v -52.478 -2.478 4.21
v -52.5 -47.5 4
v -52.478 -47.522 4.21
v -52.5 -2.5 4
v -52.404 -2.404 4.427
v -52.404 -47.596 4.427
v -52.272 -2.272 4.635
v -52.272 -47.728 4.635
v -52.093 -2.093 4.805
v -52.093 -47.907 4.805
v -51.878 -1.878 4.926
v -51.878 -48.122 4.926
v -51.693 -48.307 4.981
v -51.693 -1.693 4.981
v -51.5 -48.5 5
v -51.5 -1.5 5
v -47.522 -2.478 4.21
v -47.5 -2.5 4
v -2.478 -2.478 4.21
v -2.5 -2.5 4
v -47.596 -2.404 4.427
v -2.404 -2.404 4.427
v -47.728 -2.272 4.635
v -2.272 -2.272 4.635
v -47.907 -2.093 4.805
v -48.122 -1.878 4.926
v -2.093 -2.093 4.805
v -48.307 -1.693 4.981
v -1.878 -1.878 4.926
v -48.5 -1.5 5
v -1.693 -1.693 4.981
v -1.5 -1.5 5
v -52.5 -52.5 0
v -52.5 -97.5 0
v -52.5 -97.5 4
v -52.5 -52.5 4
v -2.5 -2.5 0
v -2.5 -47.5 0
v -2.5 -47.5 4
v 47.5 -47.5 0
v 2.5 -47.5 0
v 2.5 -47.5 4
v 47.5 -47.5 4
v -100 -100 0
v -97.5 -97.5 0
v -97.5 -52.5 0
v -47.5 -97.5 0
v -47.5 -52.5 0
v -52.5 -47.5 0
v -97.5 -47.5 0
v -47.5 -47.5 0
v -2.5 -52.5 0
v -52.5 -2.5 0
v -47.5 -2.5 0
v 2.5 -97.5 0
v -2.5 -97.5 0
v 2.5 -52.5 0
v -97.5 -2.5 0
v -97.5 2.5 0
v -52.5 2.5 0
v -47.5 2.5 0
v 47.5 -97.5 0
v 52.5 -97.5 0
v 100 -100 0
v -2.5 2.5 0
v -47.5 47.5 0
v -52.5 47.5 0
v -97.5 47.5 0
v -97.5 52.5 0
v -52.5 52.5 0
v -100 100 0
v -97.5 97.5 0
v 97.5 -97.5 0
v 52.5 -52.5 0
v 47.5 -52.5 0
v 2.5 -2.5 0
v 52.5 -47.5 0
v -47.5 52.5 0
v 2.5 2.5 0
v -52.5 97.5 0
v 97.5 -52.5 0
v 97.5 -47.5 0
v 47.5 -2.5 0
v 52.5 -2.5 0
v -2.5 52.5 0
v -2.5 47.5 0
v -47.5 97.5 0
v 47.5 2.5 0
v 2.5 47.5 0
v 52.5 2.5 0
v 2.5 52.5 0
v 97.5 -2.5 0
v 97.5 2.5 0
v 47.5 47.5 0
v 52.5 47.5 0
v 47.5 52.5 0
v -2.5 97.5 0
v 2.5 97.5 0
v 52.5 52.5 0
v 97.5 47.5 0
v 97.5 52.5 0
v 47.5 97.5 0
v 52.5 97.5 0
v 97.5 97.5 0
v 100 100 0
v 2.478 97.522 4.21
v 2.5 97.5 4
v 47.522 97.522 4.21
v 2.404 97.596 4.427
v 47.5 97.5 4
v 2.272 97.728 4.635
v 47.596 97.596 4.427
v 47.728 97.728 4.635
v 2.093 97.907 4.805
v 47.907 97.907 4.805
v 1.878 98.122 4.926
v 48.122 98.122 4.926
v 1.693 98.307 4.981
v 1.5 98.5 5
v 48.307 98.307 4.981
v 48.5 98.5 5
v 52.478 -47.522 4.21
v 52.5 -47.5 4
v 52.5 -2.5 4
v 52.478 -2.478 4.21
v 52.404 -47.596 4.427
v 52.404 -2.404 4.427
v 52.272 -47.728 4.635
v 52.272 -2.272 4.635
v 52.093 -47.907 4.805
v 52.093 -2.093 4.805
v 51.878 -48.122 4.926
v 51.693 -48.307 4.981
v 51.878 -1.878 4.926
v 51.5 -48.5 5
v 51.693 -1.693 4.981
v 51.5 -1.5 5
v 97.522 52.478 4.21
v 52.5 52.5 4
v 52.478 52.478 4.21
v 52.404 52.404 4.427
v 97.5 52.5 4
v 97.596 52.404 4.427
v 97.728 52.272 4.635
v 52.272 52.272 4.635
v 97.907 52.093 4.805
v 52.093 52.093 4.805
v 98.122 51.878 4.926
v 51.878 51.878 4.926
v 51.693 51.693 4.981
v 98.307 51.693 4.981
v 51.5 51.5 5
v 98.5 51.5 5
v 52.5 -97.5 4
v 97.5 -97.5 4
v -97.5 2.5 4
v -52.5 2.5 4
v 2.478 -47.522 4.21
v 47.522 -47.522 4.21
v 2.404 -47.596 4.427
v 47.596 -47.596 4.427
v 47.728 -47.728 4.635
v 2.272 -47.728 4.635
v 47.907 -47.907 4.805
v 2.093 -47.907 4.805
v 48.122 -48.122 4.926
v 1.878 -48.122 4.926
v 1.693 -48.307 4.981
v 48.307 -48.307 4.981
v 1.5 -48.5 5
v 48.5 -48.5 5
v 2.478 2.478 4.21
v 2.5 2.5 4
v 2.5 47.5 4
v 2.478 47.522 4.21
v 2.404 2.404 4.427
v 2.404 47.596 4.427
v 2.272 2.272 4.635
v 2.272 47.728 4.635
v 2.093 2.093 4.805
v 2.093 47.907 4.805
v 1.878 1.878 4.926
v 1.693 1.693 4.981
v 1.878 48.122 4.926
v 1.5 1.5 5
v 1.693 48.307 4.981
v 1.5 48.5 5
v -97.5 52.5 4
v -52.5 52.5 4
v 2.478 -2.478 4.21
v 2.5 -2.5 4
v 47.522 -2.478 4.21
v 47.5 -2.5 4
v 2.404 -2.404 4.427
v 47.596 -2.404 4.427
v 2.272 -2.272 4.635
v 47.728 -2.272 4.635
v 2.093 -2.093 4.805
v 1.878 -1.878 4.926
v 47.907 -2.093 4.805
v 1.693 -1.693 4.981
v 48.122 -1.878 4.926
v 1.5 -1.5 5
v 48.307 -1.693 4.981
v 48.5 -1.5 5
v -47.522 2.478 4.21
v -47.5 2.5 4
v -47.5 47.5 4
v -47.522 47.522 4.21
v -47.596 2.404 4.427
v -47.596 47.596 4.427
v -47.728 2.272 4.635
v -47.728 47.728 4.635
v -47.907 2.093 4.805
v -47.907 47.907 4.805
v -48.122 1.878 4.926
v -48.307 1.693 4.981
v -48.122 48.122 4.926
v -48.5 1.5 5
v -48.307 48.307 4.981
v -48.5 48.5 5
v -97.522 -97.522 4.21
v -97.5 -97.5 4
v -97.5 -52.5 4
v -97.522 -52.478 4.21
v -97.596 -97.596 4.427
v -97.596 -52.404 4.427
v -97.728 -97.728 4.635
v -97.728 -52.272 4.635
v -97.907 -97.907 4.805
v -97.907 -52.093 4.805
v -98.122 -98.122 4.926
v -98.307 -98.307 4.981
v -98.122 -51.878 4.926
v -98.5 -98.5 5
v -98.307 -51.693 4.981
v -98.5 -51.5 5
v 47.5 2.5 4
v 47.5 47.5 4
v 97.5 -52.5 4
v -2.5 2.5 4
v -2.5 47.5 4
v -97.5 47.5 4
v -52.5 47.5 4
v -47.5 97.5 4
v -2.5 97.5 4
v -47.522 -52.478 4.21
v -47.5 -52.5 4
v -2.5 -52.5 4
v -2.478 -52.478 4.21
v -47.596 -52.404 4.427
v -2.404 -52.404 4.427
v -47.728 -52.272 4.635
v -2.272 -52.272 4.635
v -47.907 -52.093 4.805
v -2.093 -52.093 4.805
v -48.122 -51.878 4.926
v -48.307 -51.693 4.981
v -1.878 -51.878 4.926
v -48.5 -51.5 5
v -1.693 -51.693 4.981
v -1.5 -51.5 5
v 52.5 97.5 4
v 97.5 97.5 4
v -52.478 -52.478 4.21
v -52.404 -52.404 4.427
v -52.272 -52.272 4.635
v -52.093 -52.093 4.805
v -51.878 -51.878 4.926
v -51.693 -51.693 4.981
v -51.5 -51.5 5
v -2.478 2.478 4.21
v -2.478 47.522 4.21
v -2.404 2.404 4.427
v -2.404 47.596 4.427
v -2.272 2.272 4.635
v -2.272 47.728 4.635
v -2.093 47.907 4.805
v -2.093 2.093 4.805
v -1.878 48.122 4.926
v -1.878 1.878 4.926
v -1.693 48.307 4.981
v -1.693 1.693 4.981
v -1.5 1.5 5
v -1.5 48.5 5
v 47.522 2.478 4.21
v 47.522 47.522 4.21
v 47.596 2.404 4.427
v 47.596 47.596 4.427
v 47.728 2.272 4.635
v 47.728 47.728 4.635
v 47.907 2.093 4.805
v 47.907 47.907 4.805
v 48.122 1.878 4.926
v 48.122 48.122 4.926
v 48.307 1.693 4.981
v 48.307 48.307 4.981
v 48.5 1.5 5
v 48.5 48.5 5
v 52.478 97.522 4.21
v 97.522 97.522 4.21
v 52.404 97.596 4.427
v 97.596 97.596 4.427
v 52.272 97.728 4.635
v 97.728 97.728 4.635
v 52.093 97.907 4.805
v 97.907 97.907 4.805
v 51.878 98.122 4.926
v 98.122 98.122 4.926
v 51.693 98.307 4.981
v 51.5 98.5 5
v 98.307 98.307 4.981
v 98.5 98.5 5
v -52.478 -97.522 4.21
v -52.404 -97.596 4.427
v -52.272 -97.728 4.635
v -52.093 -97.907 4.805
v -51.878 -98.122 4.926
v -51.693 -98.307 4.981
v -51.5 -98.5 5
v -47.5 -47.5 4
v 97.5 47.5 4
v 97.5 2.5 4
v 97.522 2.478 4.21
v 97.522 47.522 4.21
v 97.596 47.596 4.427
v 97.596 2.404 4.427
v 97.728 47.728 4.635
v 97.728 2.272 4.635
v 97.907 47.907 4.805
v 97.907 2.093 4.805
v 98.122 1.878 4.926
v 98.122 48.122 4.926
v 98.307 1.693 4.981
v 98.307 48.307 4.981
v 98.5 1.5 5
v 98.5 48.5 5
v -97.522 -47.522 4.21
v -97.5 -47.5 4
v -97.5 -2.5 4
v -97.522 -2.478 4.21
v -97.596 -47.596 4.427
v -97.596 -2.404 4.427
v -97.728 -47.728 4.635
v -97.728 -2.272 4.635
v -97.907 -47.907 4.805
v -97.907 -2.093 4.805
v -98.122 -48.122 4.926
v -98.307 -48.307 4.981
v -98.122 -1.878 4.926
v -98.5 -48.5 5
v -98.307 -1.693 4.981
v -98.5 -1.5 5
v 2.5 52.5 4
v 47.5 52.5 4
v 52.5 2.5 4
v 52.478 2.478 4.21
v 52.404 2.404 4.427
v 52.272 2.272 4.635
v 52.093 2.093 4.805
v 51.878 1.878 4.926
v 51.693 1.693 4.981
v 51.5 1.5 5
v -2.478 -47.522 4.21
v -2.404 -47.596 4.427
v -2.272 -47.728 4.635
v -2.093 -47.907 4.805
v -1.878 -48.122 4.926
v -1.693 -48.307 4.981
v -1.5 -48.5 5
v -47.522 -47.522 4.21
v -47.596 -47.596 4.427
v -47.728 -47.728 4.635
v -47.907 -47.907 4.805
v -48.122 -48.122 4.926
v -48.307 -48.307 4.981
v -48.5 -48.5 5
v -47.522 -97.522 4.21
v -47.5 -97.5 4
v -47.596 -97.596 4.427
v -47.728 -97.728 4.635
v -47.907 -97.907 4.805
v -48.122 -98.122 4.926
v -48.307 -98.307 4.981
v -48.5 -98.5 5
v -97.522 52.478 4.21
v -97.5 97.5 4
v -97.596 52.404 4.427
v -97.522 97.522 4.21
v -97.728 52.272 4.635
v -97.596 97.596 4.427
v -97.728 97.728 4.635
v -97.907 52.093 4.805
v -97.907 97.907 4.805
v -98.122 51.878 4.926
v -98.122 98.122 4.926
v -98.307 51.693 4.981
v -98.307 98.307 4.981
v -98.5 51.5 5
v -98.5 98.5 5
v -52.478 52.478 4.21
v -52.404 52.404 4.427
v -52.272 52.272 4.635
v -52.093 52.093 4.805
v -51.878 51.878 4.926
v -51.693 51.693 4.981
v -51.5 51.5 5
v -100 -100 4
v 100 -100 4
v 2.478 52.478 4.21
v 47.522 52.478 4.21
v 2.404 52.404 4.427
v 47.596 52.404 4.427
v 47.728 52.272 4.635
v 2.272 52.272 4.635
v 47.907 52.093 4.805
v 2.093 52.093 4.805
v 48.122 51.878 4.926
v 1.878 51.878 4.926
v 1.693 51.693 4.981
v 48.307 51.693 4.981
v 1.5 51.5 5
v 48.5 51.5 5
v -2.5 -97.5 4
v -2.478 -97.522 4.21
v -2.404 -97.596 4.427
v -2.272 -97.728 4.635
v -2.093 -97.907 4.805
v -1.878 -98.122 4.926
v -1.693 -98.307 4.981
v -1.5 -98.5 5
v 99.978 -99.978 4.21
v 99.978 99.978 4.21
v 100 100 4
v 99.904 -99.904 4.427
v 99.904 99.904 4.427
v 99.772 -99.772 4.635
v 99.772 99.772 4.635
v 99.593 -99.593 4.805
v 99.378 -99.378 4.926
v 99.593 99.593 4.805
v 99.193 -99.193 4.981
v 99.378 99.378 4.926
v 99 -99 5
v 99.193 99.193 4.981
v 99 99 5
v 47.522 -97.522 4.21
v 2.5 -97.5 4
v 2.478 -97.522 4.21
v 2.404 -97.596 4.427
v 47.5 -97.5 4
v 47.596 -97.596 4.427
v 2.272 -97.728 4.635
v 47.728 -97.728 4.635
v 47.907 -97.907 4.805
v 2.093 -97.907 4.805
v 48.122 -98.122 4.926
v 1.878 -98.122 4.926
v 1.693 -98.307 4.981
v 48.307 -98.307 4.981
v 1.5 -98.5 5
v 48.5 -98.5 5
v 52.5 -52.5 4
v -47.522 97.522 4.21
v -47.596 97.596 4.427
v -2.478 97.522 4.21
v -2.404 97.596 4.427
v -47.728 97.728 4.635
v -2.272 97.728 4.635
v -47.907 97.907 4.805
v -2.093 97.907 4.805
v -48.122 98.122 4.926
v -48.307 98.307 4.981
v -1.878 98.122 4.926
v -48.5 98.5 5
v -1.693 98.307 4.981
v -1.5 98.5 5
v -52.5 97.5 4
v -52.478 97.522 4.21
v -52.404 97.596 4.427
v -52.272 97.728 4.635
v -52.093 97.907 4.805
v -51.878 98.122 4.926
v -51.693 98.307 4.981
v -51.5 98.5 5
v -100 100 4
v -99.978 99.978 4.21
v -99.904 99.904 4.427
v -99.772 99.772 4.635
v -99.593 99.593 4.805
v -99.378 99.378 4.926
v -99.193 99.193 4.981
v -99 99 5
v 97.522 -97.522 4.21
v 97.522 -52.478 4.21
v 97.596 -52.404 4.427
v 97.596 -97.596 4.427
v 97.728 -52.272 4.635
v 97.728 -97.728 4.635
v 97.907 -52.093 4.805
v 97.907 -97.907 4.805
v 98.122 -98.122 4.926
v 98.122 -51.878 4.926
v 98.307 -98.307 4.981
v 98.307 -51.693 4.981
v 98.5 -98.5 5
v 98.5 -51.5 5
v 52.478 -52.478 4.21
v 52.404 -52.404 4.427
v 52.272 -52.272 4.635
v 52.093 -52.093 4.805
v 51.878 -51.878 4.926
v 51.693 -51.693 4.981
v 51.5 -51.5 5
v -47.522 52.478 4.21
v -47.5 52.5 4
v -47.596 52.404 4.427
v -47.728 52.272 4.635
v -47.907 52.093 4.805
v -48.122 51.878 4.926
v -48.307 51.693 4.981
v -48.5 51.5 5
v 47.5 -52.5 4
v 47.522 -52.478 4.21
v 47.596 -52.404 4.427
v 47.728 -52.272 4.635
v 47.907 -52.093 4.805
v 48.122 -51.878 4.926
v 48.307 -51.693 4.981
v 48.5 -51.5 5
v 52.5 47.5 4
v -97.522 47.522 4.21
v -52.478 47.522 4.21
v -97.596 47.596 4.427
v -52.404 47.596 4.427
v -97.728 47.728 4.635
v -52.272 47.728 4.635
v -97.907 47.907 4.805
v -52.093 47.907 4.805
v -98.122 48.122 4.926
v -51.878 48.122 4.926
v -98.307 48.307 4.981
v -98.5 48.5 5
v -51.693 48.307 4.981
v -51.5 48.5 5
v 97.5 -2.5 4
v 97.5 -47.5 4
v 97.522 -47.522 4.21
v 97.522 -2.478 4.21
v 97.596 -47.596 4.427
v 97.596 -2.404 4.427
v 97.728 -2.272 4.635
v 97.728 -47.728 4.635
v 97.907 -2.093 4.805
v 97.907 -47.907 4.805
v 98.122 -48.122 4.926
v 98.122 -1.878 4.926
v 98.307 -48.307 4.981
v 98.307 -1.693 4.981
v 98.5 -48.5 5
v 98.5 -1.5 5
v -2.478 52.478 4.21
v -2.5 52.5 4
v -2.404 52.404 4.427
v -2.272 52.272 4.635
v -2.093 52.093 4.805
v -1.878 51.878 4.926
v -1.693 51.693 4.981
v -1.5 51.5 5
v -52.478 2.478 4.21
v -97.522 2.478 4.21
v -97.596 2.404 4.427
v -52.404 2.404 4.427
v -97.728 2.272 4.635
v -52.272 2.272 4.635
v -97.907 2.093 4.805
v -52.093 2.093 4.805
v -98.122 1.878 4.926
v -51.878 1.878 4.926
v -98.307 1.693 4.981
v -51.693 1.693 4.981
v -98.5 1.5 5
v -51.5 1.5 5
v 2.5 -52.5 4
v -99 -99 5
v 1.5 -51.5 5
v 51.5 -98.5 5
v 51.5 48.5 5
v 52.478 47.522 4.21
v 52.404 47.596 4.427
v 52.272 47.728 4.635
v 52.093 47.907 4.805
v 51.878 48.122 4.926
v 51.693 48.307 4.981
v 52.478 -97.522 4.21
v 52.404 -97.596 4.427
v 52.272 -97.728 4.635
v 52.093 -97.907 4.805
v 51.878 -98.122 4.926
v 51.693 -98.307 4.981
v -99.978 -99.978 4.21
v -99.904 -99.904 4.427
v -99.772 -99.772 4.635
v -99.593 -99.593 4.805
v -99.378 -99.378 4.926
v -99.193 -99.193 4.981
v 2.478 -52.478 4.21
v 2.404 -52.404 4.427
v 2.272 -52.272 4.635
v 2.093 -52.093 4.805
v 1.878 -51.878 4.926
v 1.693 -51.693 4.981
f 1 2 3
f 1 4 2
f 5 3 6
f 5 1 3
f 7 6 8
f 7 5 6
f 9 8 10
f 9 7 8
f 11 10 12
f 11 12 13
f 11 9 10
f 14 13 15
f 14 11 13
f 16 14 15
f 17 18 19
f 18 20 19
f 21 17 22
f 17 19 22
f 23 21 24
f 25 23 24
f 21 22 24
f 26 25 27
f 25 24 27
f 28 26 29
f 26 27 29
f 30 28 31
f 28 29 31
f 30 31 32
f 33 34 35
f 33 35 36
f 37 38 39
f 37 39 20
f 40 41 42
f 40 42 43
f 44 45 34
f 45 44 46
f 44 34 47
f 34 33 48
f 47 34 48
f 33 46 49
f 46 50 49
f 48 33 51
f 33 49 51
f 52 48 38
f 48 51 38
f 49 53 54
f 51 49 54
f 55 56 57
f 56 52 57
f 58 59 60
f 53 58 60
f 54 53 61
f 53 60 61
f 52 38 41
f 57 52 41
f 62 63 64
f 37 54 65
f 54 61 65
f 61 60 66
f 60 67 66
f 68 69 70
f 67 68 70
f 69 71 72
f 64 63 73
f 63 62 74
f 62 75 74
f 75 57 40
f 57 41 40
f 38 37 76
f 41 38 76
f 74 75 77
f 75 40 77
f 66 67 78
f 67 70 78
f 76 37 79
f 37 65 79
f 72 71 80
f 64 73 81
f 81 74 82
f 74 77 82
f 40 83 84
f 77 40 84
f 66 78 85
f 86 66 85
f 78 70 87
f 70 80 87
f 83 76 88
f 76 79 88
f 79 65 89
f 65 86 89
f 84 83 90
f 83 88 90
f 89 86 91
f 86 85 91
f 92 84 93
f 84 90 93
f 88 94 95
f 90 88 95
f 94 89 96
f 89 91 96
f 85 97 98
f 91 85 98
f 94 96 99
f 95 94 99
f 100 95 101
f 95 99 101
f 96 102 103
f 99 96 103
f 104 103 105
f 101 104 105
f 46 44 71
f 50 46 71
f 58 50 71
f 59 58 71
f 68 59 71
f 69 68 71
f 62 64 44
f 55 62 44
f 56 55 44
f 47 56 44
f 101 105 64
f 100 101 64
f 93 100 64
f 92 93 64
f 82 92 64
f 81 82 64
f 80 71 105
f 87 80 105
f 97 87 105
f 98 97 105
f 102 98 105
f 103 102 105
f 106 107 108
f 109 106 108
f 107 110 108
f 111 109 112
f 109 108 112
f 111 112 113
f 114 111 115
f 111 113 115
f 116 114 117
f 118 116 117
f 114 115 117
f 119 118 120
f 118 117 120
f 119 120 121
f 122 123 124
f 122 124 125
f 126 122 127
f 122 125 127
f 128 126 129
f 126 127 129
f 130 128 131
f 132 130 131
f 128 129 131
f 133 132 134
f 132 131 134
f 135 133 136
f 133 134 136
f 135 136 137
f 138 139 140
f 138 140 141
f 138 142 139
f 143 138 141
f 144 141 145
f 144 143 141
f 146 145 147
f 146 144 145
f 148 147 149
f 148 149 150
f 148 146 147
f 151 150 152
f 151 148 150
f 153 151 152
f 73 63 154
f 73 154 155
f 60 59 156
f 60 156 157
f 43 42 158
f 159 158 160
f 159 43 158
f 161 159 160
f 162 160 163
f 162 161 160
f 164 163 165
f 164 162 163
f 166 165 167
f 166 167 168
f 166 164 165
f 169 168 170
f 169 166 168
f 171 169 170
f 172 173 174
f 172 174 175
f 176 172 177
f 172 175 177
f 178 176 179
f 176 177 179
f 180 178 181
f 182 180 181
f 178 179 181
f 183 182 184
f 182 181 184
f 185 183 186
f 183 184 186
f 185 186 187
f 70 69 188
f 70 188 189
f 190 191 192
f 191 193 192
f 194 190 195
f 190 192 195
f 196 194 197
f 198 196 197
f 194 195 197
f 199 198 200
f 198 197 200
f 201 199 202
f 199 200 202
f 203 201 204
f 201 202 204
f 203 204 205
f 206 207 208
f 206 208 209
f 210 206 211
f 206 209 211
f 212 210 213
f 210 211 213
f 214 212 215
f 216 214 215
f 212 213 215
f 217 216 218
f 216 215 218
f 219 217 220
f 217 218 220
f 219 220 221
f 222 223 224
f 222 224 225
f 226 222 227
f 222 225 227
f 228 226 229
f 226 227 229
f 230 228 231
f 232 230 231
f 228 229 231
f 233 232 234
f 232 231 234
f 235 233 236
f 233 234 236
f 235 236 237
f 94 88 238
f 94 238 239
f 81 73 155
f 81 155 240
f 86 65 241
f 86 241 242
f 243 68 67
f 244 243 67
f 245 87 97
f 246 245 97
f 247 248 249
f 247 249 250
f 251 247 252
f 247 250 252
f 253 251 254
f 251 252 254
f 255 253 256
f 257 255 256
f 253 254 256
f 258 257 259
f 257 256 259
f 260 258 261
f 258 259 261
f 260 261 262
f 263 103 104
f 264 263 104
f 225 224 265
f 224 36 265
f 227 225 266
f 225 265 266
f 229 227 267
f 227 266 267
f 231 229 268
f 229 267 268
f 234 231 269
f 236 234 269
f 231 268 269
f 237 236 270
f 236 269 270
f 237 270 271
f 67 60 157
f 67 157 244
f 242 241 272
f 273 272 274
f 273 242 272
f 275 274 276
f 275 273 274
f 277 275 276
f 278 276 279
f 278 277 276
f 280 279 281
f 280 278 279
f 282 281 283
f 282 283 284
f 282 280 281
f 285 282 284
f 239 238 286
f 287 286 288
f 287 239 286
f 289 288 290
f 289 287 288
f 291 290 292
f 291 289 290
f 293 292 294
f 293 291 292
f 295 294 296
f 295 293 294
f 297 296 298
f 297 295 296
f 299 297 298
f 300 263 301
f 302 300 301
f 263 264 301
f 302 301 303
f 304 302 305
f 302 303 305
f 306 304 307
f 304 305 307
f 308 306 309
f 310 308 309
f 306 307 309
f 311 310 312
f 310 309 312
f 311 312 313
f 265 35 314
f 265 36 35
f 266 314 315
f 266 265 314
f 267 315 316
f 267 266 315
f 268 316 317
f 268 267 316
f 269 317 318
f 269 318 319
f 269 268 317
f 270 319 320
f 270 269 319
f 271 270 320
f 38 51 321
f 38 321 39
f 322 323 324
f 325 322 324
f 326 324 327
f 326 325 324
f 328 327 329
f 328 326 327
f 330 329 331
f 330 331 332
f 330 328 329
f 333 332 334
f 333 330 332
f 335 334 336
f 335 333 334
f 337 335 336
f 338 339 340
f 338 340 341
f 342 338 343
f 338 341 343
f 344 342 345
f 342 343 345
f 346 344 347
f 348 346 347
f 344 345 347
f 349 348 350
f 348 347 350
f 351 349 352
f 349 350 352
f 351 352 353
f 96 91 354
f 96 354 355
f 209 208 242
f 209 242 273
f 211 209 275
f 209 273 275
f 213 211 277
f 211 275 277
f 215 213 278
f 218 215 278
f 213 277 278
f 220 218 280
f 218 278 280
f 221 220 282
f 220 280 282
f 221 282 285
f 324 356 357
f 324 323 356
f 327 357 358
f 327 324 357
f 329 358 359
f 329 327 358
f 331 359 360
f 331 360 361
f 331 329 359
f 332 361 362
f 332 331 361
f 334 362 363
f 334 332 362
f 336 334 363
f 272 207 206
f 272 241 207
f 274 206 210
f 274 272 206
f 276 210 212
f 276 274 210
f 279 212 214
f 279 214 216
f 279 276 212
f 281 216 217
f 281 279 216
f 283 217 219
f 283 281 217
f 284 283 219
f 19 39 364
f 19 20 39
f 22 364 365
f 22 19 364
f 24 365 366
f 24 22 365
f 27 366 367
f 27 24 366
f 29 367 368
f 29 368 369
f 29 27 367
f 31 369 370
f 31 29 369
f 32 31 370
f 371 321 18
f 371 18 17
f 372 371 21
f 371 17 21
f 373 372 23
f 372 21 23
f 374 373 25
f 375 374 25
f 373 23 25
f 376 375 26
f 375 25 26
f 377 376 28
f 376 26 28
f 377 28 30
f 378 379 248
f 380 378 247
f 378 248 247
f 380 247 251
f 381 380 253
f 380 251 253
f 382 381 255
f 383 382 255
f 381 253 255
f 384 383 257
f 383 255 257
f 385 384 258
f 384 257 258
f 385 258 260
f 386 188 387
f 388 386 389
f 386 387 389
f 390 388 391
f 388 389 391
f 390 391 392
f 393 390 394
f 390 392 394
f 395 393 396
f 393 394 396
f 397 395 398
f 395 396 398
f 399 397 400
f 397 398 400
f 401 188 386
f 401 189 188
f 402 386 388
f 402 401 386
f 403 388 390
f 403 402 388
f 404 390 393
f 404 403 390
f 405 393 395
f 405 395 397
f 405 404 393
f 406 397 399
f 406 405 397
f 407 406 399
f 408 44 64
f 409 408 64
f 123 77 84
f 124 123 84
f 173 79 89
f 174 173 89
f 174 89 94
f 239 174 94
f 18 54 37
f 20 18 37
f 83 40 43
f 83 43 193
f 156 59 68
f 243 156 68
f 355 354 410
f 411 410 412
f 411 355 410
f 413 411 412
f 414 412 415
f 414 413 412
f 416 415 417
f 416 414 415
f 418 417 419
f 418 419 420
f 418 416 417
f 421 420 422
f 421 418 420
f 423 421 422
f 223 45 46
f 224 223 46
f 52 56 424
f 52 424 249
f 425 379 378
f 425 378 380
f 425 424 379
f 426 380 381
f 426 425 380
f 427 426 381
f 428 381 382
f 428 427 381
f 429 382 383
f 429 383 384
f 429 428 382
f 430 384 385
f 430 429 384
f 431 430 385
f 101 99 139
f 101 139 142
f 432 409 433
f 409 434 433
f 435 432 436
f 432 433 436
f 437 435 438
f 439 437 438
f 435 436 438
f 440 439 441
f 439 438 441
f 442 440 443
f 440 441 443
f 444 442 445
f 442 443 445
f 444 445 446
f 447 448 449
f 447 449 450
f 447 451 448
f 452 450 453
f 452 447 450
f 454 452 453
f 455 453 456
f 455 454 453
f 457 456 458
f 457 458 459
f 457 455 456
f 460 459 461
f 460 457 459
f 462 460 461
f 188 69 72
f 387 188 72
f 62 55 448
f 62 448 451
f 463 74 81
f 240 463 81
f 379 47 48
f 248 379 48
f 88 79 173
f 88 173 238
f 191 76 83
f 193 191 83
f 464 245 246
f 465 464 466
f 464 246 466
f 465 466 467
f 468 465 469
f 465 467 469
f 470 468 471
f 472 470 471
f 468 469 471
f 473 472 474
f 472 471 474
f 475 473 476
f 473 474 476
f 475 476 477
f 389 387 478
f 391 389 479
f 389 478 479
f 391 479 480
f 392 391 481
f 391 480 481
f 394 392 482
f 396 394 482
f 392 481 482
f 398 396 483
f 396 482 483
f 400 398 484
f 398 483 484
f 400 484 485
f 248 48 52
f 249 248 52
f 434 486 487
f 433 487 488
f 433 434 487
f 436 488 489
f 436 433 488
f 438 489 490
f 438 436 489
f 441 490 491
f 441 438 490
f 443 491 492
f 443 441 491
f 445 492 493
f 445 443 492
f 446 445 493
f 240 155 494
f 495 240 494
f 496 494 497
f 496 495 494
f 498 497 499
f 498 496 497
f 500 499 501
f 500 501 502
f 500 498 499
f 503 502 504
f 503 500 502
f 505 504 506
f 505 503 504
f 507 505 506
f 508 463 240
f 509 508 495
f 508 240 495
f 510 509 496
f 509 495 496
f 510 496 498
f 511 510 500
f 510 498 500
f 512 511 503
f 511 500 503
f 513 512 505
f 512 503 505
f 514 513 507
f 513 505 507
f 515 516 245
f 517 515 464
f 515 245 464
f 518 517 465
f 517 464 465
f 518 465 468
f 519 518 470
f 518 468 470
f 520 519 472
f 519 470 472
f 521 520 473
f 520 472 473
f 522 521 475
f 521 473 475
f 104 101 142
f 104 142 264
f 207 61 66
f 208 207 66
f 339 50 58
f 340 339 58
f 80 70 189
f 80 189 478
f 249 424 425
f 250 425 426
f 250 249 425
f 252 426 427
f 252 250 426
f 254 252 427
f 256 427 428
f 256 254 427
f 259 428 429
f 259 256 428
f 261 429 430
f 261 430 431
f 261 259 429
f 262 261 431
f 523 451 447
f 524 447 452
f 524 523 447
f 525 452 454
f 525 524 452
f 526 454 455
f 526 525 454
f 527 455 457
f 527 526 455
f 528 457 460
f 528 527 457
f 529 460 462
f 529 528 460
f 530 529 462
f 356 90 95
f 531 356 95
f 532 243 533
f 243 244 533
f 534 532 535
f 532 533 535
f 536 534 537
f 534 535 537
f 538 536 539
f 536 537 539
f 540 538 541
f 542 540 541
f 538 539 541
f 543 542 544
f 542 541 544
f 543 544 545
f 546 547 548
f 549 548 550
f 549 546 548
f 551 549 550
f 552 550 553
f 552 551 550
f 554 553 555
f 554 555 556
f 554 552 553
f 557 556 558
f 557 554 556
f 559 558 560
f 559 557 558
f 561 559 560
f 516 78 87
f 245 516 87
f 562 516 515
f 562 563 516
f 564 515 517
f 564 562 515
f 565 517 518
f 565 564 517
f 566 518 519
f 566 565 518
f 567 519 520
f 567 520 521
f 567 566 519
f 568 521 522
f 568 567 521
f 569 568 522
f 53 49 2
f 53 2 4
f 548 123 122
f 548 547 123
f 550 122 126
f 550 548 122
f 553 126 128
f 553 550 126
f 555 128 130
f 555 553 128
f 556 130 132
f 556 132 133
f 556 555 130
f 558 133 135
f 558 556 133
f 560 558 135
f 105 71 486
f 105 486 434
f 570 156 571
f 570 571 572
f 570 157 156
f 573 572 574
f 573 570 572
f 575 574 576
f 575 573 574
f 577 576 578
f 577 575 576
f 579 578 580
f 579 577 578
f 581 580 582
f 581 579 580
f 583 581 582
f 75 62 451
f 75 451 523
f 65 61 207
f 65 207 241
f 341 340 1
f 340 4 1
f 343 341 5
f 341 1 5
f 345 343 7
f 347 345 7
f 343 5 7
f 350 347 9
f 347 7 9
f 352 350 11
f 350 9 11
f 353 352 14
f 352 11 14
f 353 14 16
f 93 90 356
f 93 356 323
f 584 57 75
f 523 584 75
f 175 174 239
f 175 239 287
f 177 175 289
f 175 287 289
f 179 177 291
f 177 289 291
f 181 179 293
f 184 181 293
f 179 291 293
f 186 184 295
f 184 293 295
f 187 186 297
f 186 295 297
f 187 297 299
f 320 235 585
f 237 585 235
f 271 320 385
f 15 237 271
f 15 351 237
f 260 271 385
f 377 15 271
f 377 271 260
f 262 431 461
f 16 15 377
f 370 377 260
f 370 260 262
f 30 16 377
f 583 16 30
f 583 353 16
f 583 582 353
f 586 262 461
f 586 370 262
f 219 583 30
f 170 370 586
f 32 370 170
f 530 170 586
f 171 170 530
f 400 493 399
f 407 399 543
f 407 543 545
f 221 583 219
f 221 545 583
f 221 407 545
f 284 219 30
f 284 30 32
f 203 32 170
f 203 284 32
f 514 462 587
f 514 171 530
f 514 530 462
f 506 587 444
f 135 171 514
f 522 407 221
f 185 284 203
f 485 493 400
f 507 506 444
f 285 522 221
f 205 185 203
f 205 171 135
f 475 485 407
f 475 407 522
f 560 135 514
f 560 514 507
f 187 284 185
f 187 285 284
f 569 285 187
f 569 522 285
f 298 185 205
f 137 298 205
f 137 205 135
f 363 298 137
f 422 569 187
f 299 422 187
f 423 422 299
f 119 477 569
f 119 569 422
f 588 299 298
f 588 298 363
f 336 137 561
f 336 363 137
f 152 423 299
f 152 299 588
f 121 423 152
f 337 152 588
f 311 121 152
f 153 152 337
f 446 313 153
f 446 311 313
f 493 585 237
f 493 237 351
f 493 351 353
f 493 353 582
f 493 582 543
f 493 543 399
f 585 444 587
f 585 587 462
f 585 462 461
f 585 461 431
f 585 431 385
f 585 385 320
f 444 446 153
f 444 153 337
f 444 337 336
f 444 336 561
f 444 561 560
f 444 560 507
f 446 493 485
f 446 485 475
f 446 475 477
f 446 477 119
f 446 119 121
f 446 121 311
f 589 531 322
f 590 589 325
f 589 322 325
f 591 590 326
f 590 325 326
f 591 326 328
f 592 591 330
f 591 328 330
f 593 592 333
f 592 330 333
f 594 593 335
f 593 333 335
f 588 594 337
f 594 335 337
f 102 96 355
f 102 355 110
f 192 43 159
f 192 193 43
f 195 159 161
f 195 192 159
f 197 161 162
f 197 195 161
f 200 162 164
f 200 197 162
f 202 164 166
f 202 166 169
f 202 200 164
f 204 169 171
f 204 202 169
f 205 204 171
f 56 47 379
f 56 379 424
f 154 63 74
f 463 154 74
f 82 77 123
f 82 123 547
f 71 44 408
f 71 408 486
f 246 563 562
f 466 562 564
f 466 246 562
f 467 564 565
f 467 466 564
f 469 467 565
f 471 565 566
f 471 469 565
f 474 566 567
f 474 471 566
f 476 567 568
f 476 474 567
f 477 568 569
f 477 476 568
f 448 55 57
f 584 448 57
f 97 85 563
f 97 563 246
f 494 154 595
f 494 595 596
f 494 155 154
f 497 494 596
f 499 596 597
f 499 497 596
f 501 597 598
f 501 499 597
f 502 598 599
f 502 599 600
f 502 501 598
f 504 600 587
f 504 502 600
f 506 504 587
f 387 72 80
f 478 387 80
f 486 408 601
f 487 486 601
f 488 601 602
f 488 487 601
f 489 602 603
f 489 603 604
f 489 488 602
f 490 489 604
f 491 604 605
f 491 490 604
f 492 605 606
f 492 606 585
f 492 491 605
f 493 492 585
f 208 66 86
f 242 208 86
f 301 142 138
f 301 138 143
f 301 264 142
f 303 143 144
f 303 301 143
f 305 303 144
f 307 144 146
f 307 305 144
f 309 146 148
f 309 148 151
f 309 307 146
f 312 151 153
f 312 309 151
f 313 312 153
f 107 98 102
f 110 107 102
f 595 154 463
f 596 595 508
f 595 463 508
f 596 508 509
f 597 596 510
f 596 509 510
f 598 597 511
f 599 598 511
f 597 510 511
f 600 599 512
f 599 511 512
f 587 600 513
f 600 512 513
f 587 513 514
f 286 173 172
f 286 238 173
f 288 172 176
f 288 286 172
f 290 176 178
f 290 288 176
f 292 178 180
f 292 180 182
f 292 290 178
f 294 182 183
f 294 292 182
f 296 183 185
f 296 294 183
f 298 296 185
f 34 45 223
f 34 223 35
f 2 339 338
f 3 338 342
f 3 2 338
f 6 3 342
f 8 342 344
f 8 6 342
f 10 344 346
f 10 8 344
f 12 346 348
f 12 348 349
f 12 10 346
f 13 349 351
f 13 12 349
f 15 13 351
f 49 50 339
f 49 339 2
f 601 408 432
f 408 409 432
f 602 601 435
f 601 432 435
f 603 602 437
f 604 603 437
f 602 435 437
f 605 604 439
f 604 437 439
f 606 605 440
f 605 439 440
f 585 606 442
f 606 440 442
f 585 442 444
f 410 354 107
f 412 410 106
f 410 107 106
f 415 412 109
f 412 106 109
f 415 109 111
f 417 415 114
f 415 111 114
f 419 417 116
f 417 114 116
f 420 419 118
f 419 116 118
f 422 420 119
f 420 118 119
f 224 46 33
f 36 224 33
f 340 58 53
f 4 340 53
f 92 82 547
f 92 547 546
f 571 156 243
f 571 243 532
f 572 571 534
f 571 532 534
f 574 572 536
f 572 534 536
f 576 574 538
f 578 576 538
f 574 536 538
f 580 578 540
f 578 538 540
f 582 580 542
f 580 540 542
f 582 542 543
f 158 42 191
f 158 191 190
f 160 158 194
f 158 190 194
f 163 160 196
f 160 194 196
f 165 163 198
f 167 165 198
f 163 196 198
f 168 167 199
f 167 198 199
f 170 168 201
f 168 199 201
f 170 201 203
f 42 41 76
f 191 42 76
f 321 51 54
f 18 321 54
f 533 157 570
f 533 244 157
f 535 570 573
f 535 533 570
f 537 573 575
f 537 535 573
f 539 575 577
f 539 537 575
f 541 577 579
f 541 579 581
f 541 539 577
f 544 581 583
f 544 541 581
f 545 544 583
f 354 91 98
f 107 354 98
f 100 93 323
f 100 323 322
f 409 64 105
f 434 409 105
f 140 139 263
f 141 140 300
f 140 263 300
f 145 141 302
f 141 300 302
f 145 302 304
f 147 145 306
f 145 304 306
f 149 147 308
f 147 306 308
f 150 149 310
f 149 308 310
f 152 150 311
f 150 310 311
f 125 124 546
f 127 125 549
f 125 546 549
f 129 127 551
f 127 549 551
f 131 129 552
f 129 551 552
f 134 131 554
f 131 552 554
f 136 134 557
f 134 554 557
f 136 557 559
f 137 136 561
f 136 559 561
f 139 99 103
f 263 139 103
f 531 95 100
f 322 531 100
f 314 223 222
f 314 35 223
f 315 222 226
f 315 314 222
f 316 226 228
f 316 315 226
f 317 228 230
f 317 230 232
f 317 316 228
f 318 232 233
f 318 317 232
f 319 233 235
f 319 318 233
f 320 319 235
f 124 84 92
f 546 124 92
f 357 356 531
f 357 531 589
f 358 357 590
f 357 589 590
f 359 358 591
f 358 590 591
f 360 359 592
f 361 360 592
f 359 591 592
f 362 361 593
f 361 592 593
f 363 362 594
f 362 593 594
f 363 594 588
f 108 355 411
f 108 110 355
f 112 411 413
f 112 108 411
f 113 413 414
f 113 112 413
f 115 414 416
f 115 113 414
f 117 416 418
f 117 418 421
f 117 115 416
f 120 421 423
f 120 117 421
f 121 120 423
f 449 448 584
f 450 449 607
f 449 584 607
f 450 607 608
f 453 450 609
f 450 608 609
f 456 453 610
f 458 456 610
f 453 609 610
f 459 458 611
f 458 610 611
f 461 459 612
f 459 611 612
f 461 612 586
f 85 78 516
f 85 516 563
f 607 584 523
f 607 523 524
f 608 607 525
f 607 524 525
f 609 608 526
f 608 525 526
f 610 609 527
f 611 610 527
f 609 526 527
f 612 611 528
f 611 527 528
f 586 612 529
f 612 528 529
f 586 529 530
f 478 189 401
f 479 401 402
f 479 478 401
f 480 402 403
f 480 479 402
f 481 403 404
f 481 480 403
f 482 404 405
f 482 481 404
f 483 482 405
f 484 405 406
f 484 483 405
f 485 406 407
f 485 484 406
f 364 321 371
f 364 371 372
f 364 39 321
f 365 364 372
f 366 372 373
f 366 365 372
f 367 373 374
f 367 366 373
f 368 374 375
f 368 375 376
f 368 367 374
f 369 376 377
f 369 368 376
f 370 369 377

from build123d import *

# Parameters (mm, degrees)
SKETCH2_W           = 200
SKETCH2_H           = 200
SKETCH2_W_2         = 45
SKETCH2_H_2         = 45
BOSS_EXTRUDE1_DEPTH = 5
FILLET2_R           = 1


with BuildPart() as part:
    # Sketch2 → Boss-Extrude1 (new body)
    with BuildSketch(Plane.XY):
        Rectangle(SKETCH2_W, SKETCH2_H)
        with Locations((-25, -75)):
            Rectangle(SKETCH2_W_2, SKETCH2_H_2, mode=Mode.SUBTRACT)
        with Locations((-75, 75)):
            Rectangle(SKETCH2_W_2, SKETCH2_H_2, mode=Mode.SUBTRACT)
        with Locations((-75, -75)):
            Rectangle(SKETCH2_W_2, SKETCH2_H_2, mode=Mode.SUBTRACT)
        with Locations((25, -75)):
            Rectangle(SKETCH2_W_2, SKETCH2_H_2, mode=Mode.SUBTRACT)
        with Locations((75, -75)):
            Rectangle(SKETCH2_W_2, SKETCH2_H_2, mode=Mode.SUBTRACT)
        with Locations((-25, 75)):
            Rectangle(SKETCH2_W_2, SKETCH2_H_2, mode=Mode.SUBTRACT)
        with Locations((75, -25)):
            Rectangle(SKETCH2_W_2, SKETCH2_H_2, mode=Mode.SUBTRACT)
        with Locations((75, 25)):
            Rectangle(SKETCH2_W_2, SKETCH2_H_2, mode=Mode.SUBTRACT)
        with Locations((25, 75)):
            Rectangle(SKETCH2_W_2, SKETCH2_H_2, mode=Mode.SUBTRACT)
        with Locations((75, 75)):
            Rectangle(SKETCH2_W_2, SKETCH2_H_2, mode=Mode.SUBTRACT)
        with Locations((-75, -25)):
            Rectangle(SKETCH2_W_2, SKETCH2_H_2, mode=Mode.SUBTRACT)
        with Locations((-75, 25)):
            Rectangle(SKETCH2_W_2, SKETCH2_H_2, mode=Mode.SUBTRACT)
        with Locations((25, -25)):
            Rectangle(SKETCH2_W_2, SKETCH2_H_2, mode=Mode.SUBTRACT)
        with Locations((-25, -25)):
            Rectangle(SKETCH2_W_2, SKETCH2_H_2, mode=Mode.SUBTRACT)
        with Locations((-25, 25)):
            Rectangle(SKETCH2_W_2, SKETCH2_H_2, mode=Mode.SUBTRACT)
        with Locations((25, 25)):
            Rectangle(SKETCH2_W_2, SKETCH2_H_2, mode=Mode.SUBTRACT)
    extrude(amount=BOSS_EXTRUDE1_DEPTH)

    # Fillet2
    fillet2_edges = [part.edges().sort_by_distance(p)[0] for p in [
        (75, -2.5, 5),
        (52.5, -25, 5),
        (75, -47.5, 5),
        (97.5, -25, 5),
        (25, 47.5, 5),
        (2.5, 25, 5),
        (25, 2.5, 5),
        (47.5, 25, 5),
        (-100, 0, 5),
        (75, 47.5, 5),
        (52.5, 25, 5),
        (75, 2.5, 5),
        (97.5, 25, 5),
        (-25, 97.5, 5),
        (-47.5, 75, 5),
        (-25, 52.5, 5),
        (-2.5, 75, 5),
        (47.5, 75, 5),
        (25, 97.5, 5),
        (2.5, 75, 5),
        (25, 52.5, 5),
        (47.5, -25, 5),
        (0, -100, 5),
        (25, -2.5, 5),
        (97.5, 75, 5),
        (75, 97.5, 5),
        (52.5, 75, 5),
        (75, 52.5, 5),
        (2.5, -25, 5),
        (25, -47.5, 5),
        (-52.5, -25, 5),
        (-75, -2.5, 5),
        (-97.5, -25, 5),
        (-75, -47.5, 5),
        (-52.5, 25, 5),
        (-75, 47.5, 5),
        (-97.5, 25, 5),
        (-75, 2.5, 5),
        (-75, 97.5, 5),
        (-97.5, 75, 5),
        (-75, 52.5, 5),
        (-52.5, 75, 5),
        (-52.5, -75, 5),
        (-75, -52.5, 5),
        (-97.5, -75, 5),
        (-75, -97.5, 5),
        (-25, 47.5, 5),
        (-47.5, 25, 5),
        (-25, 2.5, 5),
        (-2.5, 25, 5),
        (100, 0, 5),
        (-25, -52.5, 5),
        (-47.5, -75, 5),
        (-25, -97.5, 5),
        (-2.5, -75, 5),
        (25, -52.5, 5),
        (2.5, -75, 5),
        (25, -97.5, 5),
        (47.5, -75, 5),
        (75, -52.5, 5),
        (52.5, -75, 5),
        (75, -97.5, 5),
        (97.5, -75, 5),
        (0, 100, 5),
        (-2.5, -25, 5),
        (-25, -2.5, 5),
        (-47.5, -25, 5),
        (-25, -47.5, 5),
    ]]
    fillet(fillet2_edges, radius=FILLET2_R)


solid = part.part
